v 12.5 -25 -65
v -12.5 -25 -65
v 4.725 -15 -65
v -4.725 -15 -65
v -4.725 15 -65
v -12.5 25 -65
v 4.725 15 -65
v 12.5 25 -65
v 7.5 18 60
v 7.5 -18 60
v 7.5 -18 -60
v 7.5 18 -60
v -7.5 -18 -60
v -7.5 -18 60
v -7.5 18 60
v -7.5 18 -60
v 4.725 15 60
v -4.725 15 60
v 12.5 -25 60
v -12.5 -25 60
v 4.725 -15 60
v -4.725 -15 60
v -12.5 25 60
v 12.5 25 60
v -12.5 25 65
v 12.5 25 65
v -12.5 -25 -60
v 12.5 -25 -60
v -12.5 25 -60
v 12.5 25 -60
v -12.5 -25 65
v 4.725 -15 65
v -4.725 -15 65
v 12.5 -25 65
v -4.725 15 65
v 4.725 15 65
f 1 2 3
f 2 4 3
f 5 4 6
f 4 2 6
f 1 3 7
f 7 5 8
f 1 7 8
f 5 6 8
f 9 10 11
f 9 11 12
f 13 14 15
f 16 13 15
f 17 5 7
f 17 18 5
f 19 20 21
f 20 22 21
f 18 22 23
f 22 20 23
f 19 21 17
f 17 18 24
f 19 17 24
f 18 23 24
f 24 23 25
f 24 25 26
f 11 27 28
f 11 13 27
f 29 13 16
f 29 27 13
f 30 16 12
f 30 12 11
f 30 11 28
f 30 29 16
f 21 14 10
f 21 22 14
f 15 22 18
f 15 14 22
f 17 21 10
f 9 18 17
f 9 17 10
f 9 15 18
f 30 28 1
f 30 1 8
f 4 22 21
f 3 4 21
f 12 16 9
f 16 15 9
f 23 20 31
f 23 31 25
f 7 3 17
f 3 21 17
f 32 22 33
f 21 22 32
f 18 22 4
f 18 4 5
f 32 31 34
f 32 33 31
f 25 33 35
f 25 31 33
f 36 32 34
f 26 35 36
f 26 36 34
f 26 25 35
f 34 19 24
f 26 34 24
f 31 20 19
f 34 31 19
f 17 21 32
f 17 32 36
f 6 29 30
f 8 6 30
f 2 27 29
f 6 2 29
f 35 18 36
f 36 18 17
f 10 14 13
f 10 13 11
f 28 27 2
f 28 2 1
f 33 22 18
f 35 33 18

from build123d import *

# Parameters (mm, degrees)
SKETCH2_W           = 15
SKETCH2_H           = 36
SKETCH2_W_2         = 9.45
SKETCH2_H_2         = 30
BOSS_EXTRUDE1_DEPTH = 60
SKETCH3_W           = 25
SKETCH3_H           = 50
SKETCH3_W_2         = 9.45
SKETCH3_H_2         = 30
BOSS_EXTRUDE2_DEPTH = 5


with BuildPart() as part:
    # Sketch2 → Boss-Extrude1 (new, symmetric)
    with BuildSketch(Plane.XY):
        Rectangle(SKETCH2_W, SKETCH2_H)
        Rectangle(SKETCH2_W_2, SKETCH2_H_2, mode=Mode.SUBTRACT)
    extrude(amount=BOSS_EXTRUDE1_DEPTH, both=True)


with BuildPart() as body_2:
    # Sketch3 → Boss-Extrude2 (new body)
    with BuildSketch(Plane.XY.offset(60)):
        Rectangle(SKETCH3_W, SKETCH3_H)
        Rectangle(SKETCH3_W_2, SKETCH3_H_2, mode=Mode.SUBTRACT)
    boss_extrude2 = extrude(amount=BOSS_EXTRUDE2_DEPTH)


with BuildPart() as part_1:
    add(part.part)

    # Mirror2: Boss-Extrude2 across plane
    add(boss_extrude2.mirror(Plane.XY))


solid = Compound([body_2.part, part_1.part])
